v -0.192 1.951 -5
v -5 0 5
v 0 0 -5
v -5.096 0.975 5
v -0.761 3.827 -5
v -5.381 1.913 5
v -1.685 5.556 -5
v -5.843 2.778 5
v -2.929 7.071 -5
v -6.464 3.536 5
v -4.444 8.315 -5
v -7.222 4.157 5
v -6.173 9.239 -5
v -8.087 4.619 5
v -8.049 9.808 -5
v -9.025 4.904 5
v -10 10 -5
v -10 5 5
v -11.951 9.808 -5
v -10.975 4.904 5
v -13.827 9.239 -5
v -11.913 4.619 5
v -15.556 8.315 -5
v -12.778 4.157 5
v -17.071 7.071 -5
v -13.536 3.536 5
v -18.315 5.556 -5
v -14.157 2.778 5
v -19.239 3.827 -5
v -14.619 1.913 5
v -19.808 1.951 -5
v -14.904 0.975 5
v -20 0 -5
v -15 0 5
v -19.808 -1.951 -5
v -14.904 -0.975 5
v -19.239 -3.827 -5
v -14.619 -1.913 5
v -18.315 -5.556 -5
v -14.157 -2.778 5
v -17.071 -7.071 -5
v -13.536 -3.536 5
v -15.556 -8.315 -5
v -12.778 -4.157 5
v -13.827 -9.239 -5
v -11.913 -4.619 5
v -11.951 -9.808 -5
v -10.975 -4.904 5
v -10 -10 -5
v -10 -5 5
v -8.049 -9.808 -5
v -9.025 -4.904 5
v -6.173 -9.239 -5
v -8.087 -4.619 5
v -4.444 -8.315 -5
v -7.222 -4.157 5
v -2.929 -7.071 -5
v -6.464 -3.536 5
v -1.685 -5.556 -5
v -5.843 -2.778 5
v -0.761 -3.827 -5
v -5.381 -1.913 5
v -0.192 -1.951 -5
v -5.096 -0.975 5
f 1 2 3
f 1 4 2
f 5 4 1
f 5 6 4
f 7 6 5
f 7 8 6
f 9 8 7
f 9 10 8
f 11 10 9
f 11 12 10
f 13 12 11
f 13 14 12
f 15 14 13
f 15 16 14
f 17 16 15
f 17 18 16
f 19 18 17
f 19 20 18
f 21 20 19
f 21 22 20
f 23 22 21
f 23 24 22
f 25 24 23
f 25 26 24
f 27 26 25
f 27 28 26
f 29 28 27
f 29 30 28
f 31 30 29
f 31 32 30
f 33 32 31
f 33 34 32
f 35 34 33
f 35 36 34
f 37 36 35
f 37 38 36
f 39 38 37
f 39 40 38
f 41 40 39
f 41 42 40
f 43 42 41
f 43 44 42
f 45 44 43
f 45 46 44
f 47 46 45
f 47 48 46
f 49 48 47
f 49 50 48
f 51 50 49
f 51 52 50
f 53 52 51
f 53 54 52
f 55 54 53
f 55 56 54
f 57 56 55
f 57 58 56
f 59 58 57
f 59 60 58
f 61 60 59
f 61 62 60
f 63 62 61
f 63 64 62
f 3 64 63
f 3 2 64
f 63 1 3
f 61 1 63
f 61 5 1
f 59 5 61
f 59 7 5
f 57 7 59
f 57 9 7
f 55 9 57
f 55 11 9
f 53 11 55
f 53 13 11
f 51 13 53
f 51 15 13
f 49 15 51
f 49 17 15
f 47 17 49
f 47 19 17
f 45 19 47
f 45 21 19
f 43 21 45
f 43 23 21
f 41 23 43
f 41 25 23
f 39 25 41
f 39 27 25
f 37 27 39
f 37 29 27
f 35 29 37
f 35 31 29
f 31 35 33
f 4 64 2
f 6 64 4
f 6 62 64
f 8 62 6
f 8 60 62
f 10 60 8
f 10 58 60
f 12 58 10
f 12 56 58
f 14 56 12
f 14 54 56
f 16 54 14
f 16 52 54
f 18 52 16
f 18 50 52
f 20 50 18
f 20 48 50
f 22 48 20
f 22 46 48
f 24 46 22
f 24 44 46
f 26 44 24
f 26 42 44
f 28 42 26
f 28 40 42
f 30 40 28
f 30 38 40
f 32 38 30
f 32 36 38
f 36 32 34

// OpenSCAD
// Auther: Tobias Grundtvig
// Date: Oct 1, 2020
//
// A cone, wraps the build-in cylinder module, to get consistent naming

Cone(bottom_diameter=20, top_diameter=10, height=10, t_x="neg");

module Cone(bottom_diameter,
            top_diameter,
            height,
            t_x="center",
            t_y="center",
            t_z="center",
            angular_resolution=32)
{
    max_d = max(bottom_diameter, top_diameter);
    tx = t_x == "neg" ? -max_d/2 : 
            t_x == "pos" ? max_d/2 : 0;
    ty = t_y == "neg" ? -max_d/2 : 
            t_y == "pos" ? max_d/2 : 0;
    tz = t_z == "neg" ? -height/2 : 
            t_z == "pos" ? height/2 : 0;
    translate([tx,ty,tz])
    cylinder(d1=bottom_diameter, d2=top_diameter, h=height, center=true, $fn=angular_resolution);
}
